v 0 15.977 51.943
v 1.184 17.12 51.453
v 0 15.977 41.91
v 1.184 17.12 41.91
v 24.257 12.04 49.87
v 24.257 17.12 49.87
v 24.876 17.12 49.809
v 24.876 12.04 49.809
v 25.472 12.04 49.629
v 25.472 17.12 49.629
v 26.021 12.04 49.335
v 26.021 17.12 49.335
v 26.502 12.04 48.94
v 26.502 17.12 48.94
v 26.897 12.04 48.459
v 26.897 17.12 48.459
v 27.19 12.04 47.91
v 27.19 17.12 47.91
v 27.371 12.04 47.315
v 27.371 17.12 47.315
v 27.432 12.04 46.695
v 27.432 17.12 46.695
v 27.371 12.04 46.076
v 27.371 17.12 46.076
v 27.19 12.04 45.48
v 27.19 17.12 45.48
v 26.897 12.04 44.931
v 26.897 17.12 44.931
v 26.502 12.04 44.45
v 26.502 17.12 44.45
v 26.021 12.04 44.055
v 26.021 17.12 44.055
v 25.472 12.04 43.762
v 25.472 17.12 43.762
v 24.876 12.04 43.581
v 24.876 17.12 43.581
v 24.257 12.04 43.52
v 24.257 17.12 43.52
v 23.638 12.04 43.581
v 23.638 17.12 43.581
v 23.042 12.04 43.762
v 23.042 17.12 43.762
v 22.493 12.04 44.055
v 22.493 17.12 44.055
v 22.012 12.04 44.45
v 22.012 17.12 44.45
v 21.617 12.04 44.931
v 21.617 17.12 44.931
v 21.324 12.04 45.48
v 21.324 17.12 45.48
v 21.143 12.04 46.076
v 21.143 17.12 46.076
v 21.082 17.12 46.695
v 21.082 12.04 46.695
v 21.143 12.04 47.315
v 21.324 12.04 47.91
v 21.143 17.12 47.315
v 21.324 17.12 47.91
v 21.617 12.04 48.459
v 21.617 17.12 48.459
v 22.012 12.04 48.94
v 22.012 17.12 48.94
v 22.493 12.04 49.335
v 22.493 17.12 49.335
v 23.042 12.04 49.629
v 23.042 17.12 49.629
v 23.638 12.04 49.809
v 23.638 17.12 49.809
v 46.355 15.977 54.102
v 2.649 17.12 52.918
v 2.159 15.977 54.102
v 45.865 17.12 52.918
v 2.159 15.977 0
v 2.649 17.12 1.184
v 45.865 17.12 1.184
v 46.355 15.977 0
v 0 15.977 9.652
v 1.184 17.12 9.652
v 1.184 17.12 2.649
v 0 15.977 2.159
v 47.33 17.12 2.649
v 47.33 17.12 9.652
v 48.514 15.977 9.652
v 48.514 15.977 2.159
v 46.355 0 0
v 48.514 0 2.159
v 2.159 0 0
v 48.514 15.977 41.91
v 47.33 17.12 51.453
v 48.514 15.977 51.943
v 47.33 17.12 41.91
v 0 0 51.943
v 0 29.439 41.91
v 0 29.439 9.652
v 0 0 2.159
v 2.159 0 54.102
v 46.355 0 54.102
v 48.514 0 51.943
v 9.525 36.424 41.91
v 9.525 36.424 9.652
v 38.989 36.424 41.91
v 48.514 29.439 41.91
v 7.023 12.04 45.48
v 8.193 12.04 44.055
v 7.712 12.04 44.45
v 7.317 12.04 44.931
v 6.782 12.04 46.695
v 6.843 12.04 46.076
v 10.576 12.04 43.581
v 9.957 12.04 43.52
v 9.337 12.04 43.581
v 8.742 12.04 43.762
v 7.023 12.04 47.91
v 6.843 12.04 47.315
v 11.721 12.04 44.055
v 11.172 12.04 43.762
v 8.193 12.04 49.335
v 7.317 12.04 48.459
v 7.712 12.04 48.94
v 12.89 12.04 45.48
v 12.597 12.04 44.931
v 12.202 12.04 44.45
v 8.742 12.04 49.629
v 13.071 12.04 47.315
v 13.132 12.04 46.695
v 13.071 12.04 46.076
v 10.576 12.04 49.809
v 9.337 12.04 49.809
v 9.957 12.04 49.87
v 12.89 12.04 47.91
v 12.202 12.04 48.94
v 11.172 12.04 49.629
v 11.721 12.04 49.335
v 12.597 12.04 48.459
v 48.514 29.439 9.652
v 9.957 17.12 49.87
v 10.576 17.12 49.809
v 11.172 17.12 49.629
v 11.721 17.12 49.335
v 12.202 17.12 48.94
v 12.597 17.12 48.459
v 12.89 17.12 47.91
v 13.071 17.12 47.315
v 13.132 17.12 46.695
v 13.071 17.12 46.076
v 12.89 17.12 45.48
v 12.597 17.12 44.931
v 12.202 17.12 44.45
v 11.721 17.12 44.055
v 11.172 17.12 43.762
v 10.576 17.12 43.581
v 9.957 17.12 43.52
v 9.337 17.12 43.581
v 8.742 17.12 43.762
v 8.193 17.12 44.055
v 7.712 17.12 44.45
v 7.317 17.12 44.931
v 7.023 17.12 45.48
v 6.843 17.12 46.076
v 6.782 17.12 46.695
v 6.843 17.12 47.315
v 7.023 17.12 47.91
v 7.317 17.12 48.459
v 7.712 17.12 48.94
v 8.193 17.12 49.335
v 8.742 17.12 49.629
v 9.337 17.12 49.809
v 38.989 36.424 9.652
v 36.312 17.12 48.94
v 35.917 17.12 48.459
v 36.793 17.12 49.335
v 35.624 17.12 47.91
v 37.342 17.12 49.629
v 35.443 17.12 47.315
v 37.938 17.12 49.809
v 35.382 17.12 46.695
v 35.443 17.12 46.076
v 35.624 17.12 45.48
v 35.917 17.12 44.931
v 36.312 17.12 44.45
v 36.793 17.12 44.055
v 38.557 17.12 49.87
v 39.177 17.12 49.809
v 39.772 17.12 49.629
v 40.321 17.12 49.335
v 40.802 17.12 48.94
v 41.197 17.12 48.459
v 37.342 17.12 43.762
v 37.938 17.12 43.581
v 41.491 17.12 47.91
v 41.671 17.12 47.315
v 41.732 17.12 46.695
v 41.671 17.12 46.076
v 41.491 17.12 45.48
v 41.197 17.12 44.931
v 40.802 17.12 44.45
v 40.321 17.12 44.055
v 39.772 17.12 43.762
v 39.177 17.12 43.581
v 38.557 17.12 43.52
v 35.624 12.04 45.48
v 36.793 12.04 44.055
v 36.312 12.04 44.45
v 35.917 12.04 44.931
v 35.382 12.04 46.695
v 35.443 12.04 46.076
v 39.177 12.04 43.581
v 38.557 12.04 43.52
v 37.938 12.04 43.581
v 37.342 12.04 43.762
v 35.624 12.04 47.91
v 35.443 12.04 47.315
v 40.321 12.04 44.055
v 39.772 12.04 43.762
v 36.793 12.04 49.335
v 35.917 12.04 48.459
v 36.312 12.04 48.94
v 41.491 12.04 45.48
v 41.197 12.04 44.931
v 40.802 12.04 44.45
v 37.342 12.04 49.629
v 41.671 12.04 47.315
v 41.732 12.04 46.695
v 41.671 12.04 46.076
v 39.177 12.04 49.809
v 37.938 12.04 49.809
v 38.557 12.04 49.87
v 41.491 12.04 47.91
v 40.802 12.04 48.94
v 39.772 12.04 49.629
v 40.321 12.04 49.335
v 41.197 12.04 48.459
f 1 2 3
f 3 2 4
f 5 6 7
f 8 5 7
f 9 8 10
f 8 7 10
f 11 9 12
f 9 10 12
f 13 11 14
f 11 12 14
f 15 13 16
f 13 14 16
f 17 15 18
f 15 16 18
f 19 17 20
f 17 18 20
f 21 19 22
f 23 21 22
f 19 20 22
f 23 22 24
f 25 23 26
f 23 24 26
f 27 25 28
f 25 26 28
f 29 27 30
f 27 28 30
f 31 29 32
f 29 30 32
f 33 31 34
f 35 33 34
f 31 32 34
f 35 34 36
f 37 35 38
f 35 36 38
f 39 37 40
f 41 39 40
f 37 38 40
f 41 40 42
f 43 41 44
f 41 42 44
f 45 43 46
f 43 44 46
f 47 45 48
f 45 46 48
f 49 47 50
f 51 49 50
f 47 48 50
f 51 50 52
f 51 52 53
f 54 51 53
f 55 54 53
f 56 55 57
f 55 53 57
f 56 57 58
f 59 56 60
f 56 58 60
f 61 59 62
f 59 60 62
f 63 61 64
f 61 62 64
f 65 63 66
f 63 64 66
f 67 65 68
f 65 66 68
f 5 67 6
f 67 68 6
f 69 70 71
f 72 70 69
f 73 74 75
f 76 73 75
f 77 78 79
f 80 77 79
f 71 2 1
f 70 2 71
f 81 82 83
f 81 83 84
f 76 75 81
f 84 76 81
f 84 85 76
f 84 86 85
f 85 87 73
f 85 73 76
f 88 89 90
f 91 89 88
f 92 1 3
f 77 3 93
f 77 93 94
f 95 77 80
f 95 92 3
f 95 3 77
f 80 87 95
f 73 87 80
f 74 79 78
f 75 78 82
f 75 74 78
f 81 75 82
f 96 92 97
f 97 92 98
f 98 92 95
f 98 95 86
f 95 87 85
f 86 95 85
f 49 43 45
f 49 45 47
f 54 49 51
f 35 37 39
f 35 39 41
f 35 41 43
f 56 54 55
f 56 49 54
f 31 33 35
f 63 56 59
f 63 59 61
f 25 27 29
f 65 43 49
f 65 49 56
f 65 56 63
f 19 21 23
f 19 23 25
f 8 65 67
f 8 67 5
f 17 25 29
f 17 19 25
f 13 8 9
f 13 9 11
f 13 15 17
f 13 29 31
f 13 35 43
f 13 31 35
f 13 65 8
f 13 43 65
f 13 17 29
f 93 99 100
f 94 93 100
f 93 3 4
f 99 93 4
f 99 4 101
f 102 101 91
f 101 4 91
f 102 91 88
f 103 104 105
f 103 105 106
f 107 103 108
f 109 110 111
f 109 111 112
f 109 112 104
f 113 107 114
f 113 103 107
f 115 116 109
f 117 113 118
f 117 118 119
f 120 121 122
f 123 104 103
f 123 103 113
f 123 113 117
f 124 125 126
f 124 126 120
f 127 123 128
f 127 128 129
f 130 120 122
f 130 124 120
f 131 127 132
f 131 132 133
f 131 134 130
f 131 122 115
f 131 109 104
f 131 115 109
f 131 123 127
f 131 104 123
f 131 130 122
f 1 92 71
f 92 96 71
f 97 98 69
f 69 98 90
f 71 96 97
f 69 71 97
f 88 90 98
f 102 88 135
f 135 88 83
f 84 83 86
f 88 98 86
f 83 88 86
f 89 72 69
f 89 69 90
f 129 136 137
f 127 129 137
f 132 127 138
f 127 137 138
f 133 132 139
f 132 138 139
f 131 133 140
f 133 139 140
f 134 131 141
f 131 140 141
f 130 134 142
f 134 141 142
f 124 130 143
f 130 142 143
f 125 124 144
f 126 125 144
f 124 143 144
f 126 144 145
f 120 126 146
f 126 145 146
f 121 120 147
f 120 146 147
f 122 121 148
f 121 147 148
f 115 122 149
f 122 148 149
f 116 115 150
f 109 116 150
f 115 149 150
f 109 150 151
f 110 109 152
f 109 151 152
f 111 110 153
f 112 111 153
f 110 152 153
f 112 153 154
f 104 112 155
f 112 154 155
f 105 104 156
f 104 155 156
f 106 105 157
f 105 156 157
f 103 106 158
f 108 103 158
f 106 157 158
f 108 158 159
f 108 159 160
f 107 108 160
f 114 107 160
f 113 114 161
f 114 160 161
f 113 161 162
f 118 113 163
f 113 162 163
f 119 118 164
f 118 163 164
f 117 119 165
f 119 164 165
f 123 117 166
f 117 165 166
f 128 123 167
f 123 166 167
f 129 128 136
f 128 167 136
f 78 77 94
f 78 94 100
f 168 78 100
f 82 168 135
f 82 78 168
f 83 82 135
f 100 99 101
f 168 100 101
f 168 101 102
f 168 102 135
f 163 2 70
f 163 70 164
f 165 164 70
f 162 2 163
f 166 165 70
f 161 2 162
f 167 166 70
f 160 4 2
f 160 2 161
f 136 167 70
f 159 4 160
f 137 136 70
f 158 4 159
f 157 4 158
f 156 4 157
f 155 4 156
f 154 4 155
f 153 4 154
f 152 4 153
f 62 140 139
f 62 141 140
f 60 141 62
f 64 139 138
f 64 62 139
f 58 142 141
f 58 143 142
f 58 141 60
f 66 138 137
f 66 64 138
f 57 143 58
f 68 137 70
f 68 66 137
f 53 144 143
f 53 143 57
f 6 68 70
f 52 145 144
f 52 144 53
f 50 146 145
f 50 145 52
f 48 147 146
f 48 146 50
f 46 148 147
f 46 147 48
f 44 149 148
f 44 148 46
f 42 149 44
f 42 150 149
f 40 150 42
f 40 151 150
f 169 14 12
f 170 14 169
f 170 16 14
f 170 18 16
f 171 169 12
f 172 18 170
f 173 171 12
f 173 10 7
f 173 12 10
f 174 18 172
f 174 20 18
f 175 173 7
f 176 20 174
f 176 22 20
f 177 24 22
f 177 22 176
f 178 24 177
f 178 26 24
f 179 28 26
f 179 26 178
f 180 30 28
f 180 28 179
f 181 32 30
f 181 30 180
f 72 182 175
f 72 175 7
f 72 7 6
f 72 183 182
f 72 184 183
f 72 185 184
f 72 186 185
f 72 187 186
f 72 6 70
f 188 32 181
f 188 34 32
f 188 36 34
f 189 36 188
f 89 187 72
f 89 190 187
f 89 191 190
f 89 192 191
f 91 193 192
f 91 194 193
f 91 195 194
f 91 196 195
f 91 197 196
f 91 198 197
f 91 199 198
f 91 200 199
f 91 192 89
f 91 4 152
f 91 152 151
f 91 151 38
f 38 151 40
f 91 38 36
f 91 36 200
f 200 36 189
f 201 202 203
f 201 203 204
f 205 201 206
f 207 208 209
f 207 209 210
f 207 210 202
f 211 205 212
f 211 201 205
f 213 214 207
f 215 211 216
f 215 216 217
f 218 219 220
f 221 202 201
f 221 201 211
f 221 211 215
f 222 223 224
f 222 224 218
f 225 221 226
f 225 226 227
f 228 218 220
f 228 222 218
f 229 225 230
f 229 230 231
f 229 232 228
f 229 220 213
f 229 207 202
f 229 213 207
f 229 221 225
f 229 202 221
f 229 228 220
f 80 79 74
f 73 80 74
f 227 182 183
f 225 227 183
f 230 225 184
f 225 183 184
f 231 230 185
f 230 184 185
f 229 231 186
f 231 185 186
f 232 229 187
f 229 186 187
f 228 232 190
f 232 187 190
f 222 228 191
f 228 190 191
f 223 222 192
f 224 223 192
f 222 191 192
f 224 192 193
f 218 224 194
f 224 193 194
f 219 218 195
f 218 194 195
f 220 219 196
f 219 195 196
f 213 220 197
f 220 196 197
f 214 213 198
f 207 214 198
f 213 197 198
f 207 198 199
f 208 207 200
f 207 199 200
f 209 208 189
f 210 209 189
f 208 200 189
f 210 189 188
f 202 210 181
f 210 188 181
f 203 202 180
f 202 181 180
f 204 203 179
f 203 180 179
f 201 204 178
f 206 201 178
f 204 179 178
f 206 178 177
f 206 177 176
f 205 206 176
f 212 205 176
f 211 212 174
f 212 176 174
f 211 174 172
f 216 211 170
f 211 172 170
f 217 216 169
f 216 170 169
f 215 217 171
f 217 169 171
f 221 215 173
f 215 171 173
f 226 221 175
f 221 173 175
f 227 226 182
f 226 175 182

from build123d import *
from OCP.BRepFilletAPI import BRepFilletAPI_MakeChamfer

# Parameters (mm, degrees)
SKETCH1_W           = 48.514
SKETCH1_H           = 54.102
BOSS_EXTRUDE1_DEPTH = 17.1196
SKETCH3_W           = 48.514
SKETCH3_H           = 32.258
BOSS_EXTRUDE3_DEPTH = 19.304
CHAMFER1_SIZE       = 6.985
CHAMFER1_SIZE2      = 9.525
CHAMFER3_SIZE       = 2.159
CHAMFER4_SIZE       = 1.143
CHAMFER4_SIZE2      = 1.183611149
SKETCH4_R           = 3.175
CUT_EXTRUDE1_DEPTH  = 5.08
LPATTERN1_COUNT     = 2
LPATTERN1_PITCH     = 14.3002
LPATTERN1_COL_COUNT = 2
LPATTERN1_COL_PITCH = 14.3002


with BuildPart() as part:
    # Sketch1 → Boss-Extrude1 (new body)
    with BuildSketch(Plane(origin=(0, 0, 0), x_dir=(1, 0, 0), z_dir=(0, 1, 0))):
        with Locations((24.257, -27.051)):
            Rectangle(SKETCH1_W, SKETCH1_H)
    extrude(amount=BOSS_EXTRUDE1_DEPTH)

    # Sketch3 → Boss-Extrude3 (add)
    with BuildSketch(Plane(origin=(0, 17.1196, 0), x_dir=(1, 0, 0), z_dir=(0, 1, 0))):
        with Locations((24.257, -25.781)):
            Rectangle(SKETCH3_W, SKETCH3_H)
    extrude(amount=BOSS_EXTRUDE3_DEPTH)

    # Chamfer1: one chamfer whose edges measure the first distance from different faces: ONE call of the kernel's chamfer builder (chamfer() names one face for all edges)
    chamfer1_edges_1 = [part.edges().sort_by_distance(p)[0] for p in [
        (0, 36.4236, 25.781),
    ]]
    chamfer1_side_1 = [part.faces().sort_by_distance(p)[0] for p in [
        (0, 15.881477327, 26.540422781),
    ]]
    chamfer1_edges_2 = [part.edges().sort_by_distance(p)[0] for p in [
        (48.514, 36.4236, 25.781),
    ]]
    chamfer1_side_2 = [part.faces().sort_by_distance(p)[0] for p in [
        (48.514, 15.881477327, 26.540422781),
    ]]
    chamfer1 = BRepFilletAPI_MakeChamfer(part.part.solid().wrapped)
    for e in chamfer1_edges_1:
        chamfer1.Add(CHAMFER1_SIZE, CHAMFER1_SIZE2, e.wrapped, chamfer1_side_1[0].wrapped)  # the first distance lies on this face
    for e in chamfer1_edges_2:
        chamfer1.Add(CHAMFER1_SIZE, CHAMFER1_SIZE2, e.wrapped, chamfer1_side_2[0].wrapped)  # the first distance lies on this face
    add(Compound.cast(chamfer1.Shape()), mode=Mode.REPLACE)

    # Chamfer3
    chamfer3_edges = [part.edges().sort_by_distance(p)[0] for p in [
        (0, 8.5598, 0),
        (48.514, 8.5598, 0),
        (48.514, 8.5598, 54.102),
        (0, 8.5598, 54.102),
    ]]
    chamfer(chamfer3_edges, length=CHAMFER3_SIZE)

    # Chamfer4: one chamfer whose edges measure the first distance from different faces: ONE call of the kernel's chamfer builder (chamfer() names one face for all edges)
    chamfer4_edges_1 = [part.edges().sort_by_distance(p)[0] for p in [
        (0, 17.1196, 46.9265),
        (0, 17.1196, 5.9055),
    ]]
    chamfer4_side_1 = [part.faces().sort_by_distance(p)[0] for p in [
        (0, 13.24043998, 26.647148406),
    ]]
    chamfer4_edges_2 = [part.edges().sort_by_distance(p)[0] for p in [
        (48.514, 17.1196, 5.9055),
        (48.514, 17.1196, 46.9265),
    ]]
    chamfer4_side_2 = [part.faces().sort_by_distance(p)[0] for p in [
        (48.514, 13.24043998, 26.647148406),
    ]]
    chamfer4_edges_3 = [part.edges().sort_by_distance(p)[0] for p in [
        (24.257, 17.1196, 0),
    ]]
    chamfer4_side_3 = [part.faces().sort_by_distance(p)[0] for p in [
        (24.257, 8.5598, 0),
    ]]
    chamfer4_edges_4 = [part.edges().sort_by_distance(p)[0] for p in [
        (47.4345, 17.1196, 1.0795),
    ]]
    chamfer4_side_4 = [part.faces().sort_by_distance(p)[0] for p in [
        (47.4345, 8.5598, 1.0795),
    ]]
    chamfer4_edges_5 = [part.edges().sort_by_distance(p)[0] for p in [
        (1.0795, 17.1196, 1.0795),
    ]]
    chamfer4_side_5 = [part.faces().sort_by_distance(p)[0] for p in [
        (1.0795, 8.5598, 1.0795),
    ]]
    chamfer4_edges_6 = [part.edges().sort_by_distance(p)[0] for p in [
        (24.257, 17.1196, 54.102),
    ]]
    chamfer4_side_6 = [part.faces().sort_by_distance(p)[0] for p in [
        (24.257, 8.5598, 54.102),
    ]]
    chamfer4_edges_7 = [part.edges().sort_by_distance(p)[0] for p in [
        (1.0795, 17.1196, 53.0225),
    ]]
    chamfer4_side_7 = [part.faces().sort_by_distance(p)[0] for p in [
        (1.0795, 8.5598, 53.0225),
    ]]
    chamfer4_edges_8 = [part.edges().sort_by_distance(p)[0] for p in [
        (47.4345, 17.1196, 53.0225),
    ]]
    chamfer4_side_8 = [part.faces().sort_by_distance(p)[0] for p in [
        (47.4345, 8.5598, 53.0225),
    ]]
    chamfer4 = BRepFilletAPI_MakeChamfer(part.part.solid().wrapped)
    for e in chamfer4_edges_1:
        chamfer4.Add(CHAMFER4_SIZE, CHAMFER4_SIZE2, e.wrapped, chamfer4_side_1[0].wrapped)  # the first distance lies on this face
    for e in chamfer4_edges_2:
        chamfer4.Add(CHAMFER4_SIZE, CHAMFER4_SIZE2, e.wrapped, chamfer4_side_2[0].wrapped)  # the first distance lies on this face
    for e in chamfer4_edges_3:
        chamfer4.Add(CHAMFER4_SIZE, CHAMFER4_SIZE2, e.wrapped, chamfer4_side_3[0].wrapped)  # the first distance lies on this face
    for e in chamfer4_edges_4:
        chamfer4.Add(CHAMFER4_SIZE, CHAMFER4_SIZE2, e.wrapped, chamfer4_side_4[0].wrapped)  # the first distance lies on this face
    for e in chamfer4_edges_5:
        chamfer4.Add(CHAMFER4_SIZE, CHAMFER4_SIZE2, e.wrapped, chamfer4_side_5[0].wrapped)  # the first distance lies on this face
    for e in chamfer4_edges_6:
        chamfer4.Add(CHAMFER4_SIZE, CHAMFER4_SIZE2, e.wrapped, chamfer4_side_6[0].wrapped)  # the first distance lies on this face
    for e in chamfer4_edges_7:
        chamfer4.Add(CHAMFER4_SIZE, CHAMFER4_SIZE2, e.wrapped, chamfer4_side_7[0].wrapped)  # the first distance lies on this face
    for e in chamfer4_edges_8:
        chamfer4.Add(CHAMFER4_SIZE, CHAMFER4_SIZE2, e.wrapped, chamfer4_side_8[0].wrapped)  # the first distance lies on this face
    add(Compound.cast(chamfer4.Shape()), mode=Mode.REPLACE)

    # Sketch4 → Cut-Extrude1 (cut)
    with BuildSketch(Plane(origin=(0, 17.1196, 0), x_dir=(1, 0, 0), z_dir=(0, 1, 0))):
        with Locations(Location((24.257, -46.695388851, 0), (0, 0, 270))):
            Circle(SKETCH4_R)
    cut_extrude1 = extrude(amount=-CUT_EXTRUDE1_DEPTH, mode=Mode.SUBTRACT)

    # LPattern1: Cut-Extrude1 ×2
    with Locations(*[(i * LPATTERN1_PITCH, 0, 0) for i in range(1, LPATTERN1_COUNT)]):
        add(cut_extrude1, mode=Mode.SUBTRACT)

    # LPattern1 col: Cut-Extrude1 ×2
    with Locations(*[(-i * LPATTERN1_COL_PITCH, 0, 0) for i in range(1, LPATTERN1_COL_COUNT)]):
        add(cut_extrude1, mode=Mode.SUBTRACT)


solid = part.part
